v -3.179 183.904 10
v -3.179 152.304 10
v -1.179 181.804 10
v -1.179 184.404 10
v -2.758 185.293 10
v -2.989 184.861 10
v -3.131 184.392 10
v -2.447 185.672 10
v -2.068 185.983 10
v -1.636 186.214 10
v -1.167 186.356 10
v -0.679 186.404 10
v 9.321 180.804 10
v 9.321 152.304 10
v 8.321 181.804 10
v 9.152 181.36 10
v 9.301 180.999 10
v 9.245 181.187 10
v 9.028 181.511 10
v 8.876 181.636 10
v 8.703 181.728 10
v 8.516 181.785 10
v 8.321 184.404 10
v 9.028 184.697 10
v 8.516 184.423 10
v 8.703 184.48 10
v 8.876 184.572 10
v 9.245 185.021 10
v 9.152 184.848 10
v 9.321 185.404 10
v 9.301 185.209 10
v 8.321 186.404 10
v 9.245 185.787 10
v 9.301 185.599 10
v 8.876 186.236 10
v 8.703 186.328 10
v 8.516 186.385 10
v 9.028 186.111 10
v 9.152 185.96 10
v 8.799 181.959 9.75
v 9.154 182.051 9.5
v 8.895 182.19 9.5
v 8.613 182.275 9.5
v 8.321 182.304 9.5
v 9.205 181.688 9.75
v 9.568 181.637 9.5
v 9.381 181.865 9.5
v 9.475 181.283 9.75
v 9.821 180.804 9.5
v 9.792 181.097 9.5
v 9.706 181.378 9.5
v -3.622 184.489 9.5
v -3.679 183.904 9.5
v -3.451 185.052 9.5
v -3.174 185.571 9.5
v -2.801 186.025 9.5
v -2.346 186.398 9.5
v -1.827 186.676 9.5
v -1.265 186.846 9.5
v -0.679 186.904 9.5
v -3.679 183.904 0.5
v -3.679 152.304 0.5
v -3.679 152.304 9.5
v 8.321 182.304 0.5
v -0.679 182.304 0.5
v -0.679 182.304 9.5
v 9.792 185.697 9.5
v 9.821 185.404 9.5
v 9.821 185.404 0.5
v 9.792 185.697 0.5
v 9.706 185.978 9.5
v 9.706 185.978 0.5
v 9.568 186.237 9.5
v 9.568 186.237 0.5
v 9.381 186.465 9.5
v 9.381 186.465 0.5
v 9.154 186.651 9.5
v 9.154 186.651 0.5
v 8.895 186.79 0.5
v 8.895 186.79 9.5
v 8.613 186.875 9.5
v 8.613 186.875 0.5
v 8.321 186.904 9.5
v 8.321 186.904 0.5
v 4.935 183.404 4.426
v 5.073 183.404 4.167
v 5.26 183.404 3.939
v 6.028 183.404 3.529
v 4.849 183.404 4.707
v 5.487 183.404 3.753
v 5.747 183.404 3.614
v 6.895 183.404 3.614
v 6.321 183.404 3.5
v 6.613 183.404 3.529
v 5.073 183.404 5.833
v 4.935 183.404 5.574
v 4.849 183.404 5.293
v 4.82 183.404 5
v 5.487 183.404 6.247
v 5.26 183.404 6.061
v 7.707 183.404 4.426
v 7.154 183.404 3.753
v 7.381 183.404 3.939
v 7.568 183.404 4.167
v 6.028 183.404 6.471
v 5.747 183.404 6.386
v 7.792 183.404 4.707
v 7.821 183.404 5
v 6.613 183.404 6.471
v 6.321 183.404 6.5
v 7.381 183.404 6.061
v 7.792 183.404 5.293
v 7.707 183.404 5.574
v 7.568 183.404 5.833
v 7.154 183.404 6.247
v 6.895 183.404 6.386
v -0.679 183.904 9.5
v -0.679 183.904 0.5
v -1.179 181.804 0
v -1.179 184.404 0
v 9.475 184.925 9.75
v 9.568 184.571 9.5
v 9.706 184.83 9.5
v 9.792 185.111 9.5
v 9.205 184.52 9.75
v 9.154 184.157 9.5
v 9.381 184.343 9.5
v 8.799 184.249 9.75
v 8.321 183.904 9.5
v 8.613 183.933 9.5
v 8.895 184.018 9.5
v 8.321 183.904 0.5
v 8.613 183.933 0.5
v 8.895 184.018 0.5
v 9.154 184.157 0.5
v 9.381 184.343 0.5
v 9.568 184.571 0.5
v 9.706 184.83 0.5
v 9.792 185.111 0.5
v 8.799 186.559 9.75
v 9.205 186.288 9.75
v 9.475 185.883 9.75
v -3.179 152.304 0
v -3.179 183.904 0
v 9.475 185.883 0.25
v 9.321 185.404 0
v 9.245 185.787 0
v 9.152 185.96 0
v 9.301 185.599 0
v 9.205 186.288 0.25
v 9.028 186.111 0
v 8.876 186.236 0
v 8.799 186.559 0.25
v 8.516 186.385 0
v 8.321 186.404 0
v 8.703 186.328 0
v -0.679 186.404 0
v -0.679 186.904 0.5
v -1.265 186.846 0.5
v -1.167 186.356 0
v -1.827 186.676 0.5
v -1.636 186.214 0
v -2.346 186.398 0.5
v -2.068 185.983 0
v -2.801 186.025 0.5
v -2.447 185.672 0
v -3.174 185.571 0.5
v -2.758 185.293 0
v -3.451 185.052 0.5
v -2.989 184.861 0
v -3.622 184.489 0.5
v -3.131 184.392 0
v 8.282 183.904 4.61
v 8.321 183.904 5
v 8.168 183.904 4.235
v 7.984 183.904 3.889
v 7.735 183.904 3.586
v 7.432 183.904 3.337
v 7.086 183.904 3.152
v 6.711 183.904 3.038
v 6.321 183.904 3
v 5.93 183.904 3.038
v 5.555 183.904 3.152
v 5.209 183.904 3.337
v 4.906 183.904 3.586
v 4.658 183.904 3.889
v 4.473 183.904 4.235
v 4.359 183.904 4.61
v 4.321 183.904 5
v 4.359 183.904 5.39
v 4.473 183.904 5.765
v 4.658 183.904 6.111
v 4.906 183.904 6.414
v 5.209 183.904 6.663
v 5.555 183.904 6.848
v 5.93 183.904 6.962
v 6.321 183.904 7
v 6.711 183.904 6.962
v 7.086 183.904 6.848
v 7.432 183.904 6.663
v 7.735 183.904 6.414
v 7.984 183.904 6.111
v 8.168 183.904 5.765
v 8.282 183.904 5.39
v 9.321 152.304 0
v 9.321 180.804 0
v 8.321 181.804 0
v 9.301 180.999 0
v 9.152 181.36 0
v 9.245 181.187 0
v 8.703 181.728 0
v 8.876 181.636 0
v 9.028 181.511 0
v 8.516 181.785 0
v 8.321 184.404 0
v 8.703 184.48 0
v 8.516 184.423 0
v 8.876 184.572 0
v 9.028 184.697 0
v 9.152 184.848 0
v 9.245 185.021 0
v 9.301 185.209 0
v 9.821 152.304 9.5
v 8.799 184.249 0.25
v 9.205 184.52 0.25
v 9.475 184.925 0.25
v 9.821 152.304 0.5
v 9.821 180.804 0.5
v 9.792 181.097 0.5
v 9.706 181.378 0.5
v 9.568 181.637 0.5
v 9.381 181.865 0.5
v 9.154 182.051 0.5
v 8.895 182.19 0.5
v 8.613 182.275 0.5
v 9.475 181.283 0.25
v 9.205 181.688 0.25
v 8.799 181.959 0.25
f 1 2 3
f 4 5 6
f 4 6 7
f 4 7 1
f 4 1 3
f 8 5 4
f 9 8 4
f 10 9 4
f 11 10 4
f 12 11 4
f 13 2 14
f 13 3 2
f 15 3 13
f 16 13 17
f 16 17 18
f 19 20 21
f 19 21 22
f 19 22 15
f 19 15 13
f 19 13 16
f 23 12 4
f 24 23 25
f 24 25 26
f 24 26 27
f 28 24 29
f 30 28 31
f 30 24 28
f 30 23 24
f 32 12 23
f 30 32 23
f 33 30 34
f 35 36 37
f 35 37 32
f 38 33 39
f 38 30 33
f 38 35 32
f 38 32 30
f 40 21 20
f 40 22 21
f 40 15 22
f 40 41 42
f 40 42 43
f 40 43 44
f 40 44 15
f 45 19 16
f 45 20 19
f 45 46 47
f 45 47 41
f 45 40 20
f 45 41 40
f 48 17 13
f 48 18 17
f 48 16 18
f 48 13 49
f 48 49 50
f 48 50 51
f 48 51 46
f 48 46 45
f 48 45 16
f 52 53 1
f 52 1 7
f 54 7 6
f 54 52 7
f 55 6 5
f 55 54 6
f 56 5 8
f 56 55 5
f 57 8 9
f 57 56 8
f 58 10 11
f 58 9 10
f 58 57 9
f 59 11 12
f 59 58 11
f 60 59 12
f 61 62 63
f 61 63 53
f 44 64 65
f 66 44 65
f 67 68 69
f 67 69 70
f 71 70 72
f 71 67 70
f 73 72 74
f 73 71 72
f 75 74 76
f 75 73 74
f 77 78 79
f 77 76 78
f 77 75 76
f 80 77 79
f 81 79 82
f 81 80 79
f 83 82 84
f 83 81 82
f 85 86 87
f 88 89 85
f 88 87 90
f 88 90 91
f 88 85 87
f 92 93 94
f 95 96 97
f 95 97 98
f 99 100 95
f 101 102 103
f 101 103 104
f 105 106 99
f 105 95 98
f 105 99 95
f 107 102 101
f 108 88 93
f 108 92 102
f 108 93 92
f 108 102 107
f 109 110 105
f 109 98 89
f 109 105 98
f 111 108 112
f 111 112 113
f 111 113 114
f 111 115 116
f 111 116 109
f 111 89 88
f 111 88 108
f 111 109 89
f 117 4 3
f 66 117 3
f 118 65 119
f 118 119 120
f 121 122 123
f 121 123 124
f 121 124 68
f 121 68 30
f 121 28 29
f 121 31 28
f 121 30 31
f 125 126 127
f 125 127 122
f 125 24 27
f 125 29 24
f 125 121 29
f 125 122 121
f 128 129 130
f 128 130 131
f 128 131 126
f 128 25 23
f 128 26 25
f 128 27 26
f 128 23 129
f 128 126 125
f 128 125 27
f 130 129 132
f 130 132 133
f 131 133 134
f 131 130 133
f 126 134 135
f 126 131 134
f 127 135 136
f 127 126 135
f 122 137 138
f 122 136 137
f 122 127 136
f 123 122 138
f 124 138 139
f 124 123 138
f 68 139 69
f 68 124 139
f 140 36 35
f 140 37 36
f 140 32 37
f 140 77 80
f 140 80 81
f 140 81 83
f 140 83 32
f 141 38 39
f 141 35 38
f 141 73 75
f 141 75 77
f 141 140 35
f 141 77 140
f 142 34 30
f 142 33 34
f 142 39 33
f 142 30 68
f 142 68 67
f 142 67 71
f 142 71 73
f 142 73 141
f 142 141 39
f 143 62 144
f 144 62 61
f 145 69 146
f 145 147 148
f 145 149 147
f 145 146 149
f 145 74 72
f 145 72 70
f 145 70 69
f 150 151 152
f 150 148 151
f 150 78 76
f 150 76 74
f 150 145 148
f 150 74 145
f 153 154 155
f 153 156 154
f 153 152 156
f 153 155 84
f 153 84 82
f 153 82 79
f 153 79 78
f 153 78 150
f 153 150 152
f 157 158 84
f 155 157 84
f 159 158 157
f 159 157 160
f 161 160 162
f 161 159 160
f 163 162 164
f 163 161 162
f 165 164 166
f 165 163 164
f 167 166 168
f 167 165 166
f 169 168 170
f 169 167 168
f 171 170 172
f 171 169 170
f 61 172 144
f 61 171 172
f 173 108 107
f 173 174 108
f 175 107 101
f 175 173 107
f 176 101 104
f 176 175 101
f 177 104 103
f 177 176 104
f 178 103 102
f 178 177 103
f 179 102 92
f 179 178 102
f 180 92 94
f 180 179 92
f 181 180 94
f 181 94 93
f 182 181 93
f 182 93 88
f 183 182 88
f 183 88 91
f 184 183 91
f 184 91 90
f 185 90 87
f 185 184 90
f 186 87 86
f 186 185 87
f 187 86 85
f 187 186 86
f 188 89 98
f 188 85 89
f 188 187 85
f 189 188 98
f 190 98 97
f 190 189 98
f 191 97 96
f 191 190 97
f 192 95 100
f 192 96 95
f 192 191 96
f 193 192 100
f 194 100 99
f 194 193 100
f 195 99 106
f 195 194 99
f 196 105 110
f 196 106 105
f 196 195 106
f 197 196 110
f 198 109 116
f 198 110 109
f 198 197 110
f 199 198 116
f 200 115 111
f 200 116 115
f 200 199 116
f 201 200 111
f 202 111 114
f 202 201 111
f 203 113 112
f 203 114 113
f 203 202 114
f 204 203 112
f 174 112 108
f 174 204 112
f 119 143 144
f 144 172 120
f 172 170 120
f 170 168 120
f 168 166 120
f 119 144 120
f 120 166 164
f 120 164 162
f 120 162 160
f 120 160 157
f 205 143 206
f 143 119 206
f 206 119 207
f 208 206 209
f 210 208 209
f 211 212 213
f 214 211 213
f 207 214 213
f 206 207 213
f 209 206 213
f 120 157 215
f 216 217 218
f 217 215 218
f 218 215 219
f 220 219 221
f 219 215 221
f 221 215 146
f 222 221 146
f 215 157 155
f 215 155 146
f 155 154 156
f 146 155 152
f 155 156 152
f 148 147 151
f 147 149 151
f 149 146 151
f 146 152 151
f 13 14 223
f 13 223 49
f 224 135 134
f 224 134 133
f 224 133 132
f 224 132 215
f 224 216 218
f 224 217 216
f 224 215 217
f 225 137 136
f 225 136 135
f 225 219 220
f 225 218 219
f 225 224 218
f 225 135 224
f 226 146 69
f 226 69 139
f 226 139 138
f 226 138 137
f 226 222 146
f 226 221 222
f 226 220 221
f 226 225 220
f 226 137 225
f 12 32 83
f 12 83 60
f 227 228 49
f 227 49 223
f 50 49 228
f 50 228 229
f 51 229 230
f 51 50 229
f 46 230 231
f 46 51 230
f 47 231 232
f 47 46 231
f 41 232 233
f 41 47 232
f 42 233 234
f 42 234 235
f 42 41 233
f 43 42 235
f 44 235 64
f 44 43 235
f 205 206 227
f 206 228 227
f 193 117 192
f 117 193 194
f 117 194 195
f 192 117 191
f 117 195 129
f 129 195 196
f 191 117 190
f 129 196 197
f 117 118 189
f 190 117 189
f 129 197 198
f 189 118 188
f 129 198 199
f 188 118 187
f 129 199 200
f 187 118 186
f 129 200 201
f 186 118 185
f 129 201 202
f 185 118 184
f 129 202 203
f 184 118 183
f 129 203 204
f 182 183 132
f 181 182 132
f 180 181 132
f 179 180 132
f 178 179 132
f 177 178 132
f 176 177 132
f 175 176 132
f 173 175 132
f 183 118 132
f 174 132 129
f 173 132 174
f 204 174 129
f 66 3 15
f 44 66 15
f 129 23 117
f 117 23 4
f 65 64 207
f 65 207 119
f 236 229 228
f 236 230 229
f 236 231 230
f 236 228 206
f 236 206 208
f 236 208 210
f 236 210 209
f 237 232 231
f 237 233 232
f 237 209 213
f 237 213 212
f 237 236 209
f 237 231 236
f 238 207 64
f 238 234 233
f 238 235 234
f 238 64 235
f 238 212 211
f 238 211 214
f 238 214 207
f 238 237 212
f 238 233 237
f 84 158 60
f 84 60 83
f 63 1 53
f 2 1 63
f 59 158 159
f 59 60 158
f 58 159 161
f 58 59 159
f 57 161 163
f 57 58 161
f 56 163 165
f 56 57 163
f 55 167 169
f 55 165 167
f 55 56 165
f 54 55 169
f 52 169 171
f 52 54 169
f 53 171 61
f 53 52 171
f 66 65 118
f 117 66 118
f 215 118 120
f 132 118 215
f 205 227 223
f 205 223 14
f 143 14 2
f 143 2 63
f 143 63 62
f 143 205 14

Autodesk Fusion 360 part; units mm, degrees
sketch "Sketch2" plane through (0, 0, 0) normal (0, 0, 1) x (1, 0, 0)
  line L0 (-0.6794, 183.904) -> (9.8206, 183.904)
  line L1 (9.8206, 183.904) -> (9.8206, 182.304)
  line L2 (9.8206, 182.304) -> (-0.6794, 182.304)
  line L3 (-0.6794, 182.304) -> (-0.6794, 183.904)
  line L4 (12.8206, 179.304) -> (-3.6794, 179.304)
  line L5 (-3.6794, 179.304) -> (-3.6794, 186.904)
  line L6 (-3.6794, 186.904) -> (12.8206, 186.904)
  line L7 (12.8206, 186.904) -> (12.8206, 179.304)
  line L8 (-3.6794, 182.304) -> (12.8206, 182.304)
  line L9 (12.8206, 182.304) -> (12.8206, 152.304)
  line L10 (12.8206, 152.304) -> (-3.6794, 152.304)
  line L11 (-3.6794, 152.304) -> (-3.6794, 182.304)
  line L12 (9.8206, 186.904) -> (9.8206, 152.304)
  dimension "d63" = 10.5
  dimension "d64" = 1.6
  dimension "d66" = 30
extrude "Extrude12" add sketch "Sketch2" along normal blind 10 contours L0 L3 L5 L6 L8 L12 | L2 L4 L5 L8 L11 L12 | L4 L10 L11 L12
fillet "Fillet1" radius 1.5 3 edges at (9.8206, 183.904, 5) (9.8206, 186.904, 5) (9.8206, 182.304, 5)
fillet "Fillet2" radius 3 1 edges at (-3.6794, 186.904, 5)
chamfer "Chamfer2" distance 0.5 angle 45 18 edges at (-3.6794, 168.104, 0) (-2.8008, 186.0253, 0) (3.8206, 186.904, 0) (9.8206, 185.404, 0) (3.8206, 183.904, 0) (-0.6794, 183.104, 0) (3.8206, 182.304, 0) (9.3812, 181.8646, 0) (9.8206, 166.554, 0) (-3.6794, 168.104, 10) (-2.8008, 186.0253, 10) (3.8206, 186.904, 10) (9.8206, 185.404, 10) (3.8206, 183.904, 10) (3.8206, 182.304, 10) (9.3812, 181.8646, 10) (9.8206, 166.554, 10) (-0.6794, 183.104, 10)
sketch "Sketch3" plane through (0, 183.904, 0) normal (0, -1, 0) x (1, 0, 0)
  line L0 (8.3206, 9.5) -> (-0.6794, 9.5)
  line L1 (-0.6794, 9.5) -> (-0.6794, 0.5)
  line L2 (-0.6794, 0.5) -> (8.3206, 0.5)
  line L3 (8.3206, 0.5) -> (8.3206, 9.5)
  line L4 (-0.6794, 9.5) -> (8.3206, 0.5) construction
  line L5 (-0.6794, 0.5) -> (8.3206, 9.5) construction
  line L6 (8.3206, 5) -> (3.8206, 5) construction
  circle A0 centre (6.3206, 5) radius 2
  dimension "d75" = 4
extrude "Extrude13" add sketch "Sketch3" along normal blind 0.5 contours A0
chamfer "Chamfer3" distance 0.5 angle 45 1 edges at (4.4559, 183.404, 4.2768)
equation "d63 = slot_depth"
equation "d64 = pcb_thickness"
equation "d65 = -wall_thickness"
equation "d66 = leg_height"
equation "d67 = leg_thickness"
equation "leg_height = 30 mm"
equation "pcb_thickness = 1.6 mm"
equation "wall_thickness = 3 mm"
equation "slot_depth = 10.5 mm"
equation "leg_thickness = 10 mm"
